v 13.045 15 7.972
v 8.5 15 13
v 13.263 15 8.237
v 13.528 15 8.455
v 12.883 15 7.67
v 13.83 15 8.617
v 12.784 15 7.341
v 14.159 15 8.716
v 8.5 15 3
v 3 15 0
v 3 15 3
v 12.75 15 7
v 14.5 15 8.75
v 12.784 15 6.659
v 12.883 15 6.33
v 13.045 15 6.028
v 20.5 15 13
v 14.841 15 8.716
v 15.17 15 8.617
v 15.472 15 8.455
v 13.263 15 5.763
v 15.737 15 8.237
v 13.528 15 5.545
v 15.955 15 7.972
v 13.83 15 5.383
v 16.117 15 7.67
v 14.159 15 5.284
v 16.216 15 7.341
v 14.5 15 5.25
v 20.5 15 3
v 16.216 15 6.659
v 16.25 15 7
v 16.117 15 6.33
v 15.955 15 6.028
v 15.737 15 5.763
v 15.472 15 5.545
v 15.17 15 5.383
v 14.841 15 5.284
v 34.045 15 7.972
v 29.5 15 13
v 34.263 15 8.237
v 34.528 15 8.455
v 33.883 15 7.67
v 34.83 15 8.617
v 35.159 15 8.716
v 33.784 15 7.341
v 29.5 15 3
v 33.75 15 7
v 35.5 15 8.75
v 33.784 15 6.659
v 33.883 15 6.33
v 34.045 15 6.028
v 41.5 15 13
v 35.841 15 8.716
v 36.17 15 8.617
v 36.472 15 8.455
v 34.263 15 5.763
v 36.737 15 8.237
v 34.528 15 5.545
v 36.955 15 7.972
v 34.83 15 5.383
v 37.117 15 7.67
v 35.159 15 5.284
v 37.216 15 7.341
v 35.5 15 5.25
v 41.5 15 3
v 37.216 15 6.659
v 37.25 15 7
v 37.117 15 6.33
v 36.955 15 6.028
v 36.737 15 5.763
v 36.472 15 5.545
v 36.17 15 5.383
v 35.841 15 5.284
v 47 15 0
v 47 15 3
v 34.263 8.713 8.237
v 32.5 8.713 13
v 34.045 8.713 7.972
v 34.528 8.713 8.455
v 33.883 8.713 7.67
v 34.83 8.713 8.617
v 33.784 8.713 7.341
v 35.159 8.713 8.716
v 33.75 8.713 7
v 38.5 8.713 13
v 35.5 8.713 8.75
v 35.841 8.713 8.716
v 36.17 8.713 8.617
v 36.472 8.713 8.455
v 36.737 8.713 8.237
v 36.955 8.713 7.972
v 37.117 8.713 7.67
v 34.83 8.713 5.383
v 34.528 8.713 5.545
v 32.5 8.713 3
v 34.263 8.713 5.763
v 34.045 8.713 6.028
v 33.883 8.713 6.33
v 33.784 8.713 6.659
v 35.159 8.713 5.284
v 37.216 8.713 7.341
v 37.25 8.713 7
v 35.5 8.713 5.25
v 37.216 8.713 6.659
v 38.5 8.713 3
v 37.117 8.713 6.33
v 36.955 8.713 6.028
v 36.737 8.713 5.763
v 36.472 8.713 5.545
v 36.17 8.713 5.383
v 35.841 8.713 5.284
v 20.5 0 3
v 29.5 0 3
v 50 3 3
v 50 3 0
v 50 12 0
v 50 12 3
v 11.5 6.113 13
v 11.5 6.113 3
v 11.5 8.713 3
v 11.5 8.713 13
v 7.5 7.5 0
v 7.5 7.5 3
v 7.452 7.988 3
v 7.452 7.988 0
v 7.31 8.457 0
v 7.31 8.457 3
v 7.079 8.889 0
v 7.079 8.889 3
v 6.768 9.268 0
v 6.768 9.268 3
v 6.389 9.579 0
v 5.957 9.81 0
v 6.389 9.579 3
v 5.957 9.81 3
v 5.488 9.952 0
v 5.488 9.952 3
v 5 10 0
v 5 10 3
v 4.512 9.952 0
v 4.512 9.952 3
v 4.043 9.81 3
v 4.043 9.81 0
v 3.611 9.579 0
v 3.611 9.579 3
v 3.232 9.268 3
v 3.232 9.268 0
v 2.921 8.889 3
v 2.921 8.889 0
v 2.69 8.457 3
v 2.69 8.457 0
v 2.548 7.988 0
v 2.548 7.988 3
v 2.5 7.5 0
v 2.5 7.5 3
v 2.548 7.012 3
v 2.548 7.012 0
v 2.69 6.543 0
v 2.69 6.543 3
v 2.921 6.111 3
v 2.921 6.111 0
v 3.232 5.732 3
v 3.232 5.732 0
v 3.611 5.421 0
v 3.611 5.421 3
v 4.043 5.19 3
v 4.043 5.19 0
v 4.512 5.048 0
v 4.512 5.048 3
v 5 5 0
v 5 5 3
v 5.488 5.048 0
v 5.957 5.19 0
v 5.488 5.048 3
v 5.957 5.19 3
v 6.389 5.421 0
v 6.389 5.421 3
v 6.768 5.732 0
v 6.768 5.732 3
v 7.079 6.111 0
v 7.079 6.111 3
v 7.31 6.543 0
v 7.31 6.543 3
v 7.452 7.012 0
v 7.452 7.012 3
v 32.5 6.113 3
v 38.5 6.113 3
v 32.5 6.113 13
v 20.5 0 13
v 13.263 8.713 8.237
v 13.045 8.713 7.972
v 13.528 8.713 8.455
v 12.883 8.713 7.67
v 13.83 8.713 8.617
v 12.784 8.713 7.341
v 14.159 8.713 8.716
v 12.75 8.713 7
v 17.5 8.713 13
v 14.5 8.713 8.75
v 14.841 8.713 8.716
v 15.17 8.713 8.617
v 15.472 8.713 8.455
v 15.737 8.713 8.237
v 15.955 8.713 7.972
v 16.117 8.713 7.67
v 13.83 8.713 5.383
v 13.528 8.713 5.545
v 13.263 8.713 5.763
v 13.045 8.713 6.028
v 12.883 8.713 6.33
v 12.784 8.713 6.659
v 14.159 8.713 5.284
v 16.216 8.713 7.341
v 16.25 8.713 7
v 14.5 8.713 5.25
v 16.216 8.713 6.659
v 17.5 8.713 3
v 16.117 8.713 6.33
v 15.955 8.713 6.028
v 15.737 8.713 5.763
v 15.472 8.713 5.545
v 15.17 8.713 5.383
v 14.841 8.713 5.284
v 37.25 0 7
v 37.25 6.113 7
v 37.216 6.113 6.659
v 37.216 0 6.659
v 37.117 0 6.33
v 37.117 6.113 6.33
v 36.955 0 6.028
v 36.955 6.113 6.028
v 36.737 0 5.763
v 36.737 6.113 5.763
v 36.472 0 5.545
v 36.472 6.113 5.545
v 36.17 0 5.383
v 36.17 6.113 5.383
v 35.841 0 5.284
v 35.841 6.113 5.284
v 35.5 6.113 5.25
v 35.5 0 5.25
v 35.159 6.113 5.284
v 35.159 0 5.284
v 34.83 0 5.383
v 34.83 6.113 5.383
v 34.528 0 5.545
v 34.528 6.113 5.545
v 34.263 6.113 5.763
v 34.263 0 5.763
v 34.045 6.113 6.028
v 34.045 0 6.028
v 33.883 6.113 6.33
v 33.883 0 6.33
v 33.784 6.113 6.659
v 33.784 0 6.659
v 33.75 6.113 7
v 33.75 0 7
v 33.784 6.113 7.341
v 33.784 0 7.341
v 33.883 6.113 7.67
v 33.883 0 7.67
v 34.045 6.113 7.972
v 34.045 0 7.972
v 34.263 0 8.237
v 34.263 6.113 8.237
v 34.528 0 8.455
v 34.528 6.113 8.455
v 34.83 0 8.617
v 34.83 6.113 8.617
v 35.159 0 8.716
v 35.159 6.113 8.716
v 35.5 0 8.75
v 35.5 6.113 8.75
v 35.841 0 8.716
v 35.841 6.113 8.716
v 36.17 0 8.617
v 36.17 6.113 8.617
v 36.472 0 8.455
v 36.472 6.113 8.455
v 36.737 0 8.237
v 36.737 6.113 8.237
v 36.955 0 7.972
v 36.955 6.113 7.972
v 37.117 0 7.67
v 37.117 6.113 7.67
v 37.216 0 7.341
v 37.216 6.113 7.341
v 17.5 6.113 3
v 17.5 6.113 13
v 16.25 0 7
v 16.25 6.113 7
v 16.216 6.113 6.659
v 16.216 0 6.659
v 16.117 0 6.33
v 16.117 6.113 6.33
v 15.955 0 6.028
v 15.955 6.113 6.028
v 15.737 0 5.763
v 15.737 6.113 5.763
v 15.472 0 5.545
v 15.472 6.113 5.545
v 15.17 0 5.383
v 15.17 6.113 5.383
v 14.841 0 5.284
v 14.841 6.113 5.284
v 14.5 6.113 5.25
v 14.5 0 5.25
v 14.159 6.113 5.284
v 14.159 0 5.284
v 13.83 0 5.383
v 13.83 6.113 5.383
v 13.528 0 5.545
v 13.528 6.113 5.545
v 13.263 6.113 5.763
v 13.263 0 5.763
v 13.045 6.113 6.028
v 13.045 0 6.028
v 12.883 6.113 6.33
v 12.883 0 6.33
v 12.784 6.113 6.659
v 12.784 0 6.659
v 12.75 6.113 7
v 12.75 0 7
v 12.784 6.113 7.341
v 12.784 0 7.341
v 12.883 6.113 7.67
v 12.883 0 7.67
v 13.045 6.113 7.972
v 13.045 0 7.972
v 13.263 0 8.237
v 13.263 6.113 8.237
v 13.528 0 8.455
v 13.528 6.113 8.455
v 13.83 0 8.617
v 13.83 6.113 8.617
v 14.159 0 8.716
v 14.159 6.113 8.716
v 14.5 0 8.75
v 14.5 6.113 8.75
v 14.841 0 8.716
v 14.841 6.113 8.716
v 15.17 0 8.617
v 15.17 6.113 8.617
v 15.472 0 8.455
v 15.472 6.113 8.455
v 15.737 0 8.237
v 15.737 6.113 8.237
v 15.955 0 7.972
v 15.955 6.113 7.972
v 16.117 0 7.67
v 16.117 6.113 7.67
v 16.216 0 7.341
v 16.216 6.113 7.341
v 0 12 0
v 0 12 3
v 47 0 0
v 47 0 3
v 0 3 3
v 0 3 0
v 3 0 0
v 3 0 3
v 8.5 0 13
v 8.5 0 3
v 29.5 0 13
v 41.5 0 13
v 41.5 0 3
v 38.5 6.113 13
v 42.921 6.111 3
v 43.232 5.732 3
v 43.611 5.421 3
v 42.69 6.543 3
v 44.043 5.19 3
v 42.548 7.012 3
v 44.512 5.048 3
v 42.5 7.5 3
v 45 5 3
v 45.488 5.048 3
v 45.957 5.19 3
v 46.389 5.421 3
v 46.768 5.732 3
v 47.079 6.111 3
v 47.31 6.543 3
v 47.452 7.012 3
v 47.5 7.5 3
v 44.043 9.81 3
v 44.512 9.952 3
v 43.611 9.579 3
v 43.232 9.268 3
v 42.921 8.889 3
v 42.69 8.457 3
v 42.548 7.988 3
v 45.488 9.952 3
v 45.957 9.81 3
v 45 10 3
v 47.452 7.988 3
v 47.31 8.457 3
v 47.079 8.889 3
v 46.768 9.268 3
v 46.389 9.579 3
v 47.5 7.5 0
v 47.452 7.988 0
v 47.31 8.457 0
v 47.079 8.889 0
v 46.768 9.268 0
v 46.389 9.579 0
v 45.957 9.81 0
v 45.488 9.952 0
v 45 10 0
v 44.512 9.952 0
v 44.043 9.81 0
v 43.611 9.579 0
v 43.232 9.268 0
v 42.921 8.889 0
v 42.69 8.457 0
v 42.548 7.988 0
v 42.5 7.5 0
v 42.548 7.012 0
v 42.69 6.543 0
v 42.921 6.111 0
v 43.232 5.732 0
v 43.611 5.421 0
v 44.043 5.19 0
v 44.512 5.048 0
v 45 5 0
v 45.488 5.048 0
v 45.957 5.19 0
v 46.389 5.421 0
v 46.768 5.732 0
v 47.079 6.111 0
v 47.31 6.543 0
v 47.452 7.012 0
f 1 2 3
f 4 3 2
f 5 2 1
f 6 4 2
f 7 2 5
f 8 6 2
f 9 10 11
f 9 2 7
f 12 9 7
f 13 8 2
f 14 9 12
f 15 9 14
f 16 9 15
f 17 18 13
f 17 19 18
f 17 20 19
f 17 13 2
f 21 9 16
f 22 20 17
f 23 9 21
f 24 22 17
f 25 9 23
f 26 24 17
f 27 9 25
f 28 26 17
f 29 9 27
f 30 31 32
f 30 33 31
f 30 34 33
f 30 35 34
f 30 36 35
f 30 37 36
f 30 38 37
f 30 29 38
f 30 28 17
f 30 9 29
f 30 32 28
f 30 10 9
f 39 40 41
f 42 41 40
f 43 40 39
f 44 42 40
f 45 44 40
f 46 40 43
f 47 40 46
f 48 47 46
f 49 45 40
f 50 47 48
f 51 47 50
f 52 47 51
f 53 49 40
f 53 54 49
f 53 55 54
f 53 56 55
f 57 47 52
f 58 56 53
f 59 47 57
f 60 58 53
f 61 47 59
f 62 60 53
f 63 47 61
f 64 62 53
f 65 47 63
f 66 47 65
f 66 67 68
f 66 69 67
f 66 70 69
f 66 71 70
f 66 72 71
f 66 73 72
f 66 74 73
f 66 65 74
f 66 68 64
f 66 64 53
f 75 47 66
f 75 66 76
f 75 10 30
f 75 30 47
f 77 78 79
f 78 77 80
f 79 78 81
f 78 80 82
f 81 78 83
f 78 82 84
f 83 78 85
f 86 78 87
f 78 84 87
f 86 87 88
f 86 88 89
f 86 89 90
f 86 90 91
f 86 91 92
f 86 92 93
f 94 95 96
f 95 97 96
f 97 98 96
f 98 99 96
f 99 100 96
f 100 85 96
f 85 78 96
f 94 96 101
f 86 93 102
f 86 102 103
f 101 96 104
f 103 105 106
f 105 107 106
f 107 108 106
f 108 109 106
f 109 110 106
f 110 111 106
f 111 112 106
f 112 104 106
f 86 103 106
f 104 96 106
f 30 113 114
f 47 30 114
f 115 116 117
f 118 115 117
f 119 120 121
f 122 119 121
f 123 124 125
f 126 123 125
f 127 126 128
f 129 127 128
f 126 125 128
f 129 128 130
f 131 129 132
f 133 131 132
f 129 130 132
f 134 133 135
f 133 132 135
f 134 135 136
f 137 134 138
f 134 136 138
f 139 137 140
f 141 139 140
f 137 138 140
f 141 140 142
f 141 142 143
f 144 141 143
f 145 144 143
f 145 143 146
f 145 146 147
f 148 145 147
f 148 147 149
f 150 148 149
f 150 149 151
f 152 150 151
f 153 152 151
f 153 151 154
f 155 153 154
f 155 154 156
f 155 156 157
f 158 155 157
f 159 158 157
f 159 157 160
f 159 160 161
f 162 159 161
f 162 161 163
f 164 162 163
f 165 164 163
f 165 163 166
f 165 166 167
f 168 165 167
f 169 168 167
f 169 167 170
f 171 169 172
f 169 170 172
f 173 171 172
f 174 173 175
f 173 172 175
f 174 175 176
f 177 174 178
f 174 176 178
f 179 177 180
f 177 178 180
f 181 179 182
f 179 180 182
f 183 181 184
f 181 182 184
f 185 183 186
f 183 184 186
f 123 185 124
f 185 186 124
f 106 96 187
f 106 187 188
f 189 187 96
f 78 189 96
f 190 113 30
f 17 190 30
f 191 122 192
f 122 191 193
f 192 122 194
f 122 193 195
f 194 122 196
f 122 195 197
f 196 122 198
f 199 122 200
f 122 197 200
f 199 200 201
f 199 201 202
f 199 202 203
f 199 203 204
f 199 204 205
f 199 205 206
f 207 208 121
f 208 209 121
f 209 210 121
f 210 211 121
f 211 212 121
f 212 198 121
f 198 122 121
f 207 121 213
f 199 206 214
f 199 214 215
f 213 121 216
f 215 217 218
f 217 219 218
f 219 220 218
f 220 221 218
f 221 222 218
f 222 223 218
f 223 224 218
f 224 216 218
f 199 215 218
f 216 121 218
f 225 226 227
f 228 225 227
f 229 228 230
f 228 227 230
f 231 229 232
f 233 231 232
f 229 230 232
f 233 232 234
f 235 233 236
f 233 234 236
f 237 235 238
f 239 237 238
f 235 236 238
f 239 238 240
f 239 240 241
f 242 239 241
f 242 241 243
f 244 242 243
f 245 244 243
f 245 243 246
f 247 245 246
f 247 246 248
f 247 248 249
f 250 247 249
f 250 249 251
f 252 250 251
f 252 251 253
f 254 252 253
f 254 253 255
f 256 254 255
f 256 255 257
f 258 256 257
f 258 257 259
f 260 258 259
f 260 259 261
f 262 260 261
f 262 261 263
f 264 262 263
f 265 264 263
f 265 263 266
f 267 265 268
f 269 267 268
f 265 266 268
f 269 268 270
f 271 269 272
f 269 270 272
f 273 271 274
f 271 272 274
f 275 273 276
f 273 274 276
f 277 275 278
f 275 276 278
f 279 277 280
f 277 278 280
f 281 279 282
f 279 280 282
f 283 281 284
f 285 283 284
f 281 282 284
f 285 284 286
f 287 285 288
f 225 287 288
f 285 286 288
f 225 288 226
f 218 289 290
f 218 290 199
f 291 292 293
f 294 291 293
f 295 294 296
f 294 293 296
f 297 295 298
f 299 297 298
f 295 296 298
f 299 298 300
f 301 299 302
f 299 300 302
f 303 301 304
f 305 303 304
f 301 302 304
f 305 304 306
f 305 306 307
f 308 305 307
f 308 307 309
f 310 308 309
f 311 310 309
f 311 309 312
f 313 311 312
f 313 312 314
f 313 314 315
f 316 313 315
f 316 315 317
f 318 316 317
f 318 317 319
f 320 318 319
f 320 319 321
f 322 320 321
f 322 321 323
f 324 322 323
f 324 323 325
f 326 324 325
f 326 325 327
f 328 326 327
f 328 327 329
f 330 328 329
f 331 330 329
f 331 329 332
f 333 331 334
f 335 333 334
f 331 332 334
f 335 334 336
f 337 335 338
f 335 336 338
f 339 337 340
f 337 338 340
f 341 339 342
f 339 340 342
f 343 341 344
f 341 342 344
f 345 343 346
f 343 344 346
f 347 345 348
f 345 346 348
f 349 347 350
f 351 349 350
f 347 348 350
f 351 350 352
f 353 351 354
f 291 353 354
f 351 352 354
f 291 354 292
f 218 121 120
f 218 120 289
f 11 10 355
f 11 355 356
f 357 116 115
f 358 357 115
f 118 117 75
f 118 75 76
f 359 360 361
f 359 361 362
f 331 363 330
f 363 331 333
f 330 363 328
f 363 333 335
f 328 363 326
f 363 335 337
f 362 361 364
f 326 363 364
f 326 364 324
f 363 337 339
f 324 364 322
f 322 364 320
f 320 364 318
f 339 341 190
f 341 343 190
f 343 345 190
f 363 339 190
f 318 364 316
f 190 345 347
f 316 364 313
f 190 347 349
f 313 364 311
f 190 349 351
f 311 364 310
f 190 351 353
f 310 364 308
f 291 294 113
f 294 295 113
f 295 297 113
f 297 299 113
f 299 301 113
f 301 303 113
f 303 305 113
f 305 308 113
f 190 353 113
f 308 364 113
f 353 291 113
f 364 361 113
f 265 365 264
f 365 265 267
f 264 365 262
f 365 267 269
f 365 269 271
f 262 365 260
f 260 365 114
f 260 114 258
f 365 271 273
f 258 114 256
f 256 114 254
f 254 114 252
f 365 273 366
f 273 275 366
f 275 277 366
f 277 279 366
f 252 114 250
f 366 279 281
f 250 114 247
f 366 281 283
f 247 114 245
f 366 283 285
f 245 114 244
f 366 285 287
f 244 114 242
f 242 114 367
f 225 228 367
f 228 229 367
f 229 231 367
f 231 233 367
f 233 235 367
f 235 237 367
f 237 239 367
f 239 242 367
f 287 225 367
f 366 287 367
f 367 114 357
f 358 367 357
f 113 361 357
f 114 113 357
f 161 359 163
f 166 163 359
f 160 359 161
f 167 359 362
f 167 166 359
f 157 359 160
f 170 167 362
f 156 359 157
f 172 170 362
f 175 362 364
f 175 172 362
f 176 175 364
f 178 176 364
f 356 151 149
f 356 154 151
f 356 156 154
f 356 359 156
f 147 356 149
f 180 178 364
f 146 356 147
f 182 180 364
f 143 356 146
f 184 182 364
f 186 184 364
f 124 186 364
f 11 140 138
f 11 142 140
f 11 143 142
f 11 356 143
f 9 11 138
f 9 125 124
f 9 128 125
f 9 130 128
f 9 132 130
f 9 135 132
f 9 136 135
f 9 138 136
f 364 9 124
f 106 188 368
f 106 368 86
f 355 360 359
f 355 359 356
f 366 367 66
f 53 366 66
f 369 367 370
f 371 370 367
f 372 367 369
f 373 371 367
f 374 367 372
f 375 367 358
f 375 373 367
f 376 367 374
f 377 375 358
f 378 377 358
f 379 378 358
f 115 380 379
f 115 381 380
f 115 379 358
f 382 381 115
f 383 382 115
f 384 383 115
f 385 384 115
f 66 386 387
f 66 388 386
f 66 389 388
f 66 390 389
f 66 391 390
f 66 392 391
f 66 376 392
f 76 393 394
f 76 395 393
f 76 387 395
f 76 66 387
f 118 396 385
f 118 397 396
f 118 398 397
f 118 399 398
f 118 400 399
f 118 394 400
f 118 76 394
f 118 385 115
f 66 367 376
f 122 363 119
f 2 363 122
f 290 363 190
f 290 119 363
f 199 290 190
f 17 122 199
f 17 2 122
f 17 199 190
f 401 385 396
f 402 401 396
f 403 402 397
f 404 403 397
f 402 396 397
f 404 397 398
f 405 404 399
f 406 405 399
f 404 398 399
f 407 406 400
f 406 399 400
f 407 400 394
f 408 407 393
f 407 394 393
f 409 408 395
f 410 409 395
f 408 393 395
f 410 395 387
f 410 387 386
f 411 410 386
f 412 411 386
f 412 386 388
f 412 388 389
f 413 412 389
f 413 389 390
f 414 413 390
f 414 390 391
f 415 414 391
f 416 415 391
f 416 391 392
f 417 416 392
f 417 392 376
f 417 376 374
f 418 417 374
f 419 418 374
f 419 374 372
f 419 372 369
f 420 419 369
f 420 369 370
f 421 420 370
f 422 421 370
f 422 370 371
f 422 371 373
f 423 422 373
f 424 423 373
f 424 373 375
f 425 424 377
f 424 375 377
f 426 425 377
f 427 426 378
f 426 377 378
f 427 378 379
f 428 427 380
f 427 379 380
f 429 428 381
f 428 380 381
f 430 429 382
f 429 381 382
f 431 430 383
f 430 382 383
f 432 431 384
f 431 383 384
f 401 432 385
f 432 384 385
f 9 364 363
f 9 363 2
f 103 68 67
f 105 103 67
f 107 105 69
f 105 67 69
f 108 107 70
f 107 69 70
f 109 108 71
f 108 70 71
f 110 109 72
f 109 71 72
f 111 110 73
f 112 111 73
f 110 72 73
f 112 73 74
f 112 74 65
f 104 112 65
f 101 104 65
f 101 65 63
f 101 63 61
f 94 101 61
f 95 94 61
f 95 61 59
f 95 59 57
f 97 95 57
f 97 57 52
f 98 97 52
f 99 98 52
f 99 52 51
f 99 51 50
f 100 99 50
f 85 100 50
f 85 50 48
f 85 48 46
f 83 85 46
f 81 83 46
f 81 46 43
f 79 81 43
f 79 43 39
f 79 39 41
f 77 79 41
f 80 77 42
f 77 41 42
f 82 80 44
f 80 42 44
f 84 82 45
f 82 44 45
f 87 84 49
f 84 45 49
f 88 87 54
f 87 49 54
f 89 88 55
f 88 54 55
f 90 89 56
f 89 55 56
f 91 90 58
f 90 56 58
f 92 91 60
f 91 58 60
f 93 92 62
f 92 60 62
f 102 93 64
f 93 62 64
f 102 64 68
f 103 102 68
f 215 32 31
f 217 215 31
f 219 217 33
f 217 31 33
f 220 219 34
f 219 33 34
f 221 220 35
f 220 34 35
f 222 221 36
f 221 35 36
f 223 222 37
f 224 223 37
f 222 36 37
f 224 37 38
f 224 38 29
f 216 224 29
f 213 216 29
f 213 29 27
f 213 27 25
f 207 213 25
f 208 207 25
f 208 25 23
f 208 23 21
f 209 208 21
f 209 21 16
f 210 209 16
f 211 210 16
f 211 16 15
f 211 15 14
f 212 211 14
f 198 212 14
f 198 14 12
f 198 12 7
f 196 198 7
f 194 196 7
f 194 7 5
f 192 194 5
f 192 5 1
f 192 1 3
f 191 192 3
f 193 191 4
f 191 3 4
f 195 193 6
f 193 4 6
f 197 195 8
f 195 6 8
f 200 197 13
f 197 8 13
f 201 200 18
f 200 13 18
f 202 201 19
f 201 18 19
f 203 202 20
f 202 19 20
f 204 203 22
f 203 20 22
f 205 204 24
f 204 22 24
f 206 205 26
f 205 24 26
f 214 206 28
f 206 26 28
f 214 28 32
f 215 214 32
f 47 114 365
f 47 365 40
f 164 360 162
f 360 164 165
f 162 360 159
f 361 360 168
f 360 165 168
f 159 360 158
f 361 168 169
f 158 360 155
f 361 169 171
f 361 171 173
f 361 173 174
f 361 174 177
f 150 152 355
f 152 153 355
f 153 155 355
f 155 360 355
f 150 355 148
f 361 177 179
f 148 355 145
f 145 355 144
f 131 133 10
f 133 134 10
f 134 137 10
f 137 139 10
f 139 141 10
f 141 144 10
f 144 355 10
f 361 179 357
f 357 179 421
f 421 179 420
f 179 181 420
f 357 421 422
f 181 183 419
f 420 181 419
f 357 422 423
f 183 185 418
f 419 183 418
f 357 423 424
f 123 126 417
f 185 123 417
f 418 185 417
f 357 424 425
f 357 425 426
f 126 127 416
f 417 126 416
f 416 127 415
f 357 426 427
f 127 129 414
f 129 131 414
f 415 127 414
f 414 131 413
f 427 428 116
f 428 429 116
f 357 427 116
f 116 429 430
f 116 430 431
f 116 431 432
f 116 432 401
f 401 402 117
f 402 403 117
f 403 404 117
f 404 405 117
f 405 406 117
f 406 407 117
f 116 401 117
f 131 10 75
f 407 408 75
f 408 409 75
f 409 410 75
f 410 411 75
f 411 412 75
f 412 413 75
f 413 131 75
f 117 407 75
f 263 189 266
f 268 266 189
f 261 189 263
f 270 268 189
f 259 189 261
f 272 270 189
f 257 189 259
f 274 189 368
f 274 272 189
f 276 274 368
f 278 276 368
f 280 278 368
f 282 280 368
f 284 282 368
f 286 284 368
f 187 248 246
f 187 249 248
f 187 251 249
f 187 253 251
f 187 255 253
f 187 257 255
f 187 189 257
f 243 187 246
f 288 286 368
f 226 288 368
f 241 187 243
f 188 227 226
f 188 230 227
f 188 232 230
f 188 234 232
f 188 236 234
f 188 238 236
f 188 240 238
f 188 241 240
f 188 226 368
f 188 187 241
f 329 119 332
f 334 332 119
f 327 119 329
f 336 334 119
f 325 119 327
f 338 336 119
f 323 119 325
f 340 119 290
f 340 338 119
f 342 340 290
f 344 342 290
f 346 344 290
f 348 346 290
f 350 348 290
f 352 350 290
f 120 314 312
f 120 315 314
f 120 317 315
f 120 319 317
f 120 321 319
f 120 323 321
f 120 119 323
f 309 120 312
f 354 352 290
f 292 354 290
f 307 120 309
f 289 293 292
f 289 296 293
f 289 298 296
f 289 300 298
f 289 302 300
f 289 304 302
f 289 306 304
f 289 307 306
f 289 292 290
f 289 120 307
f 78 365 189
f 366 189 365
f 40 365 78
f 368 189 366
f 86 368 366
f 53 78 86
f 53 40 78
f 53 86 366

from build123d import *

# Parameters (mm, degrees)
SKETCH1_W           = 50
SKETCH1_H           = 15
BOSS_EXTRUDE1_DEPTH = 3
SKETCH2_R           = 2.5
CUT_EXTRUDE1_DEPTH  = 4
SKETCH3_W           = 12
SKETCH3_H           = 15
SKETCH3_W_2         = 6
SKETCH3_H_2         = 2.6
BOSS_EXTRUDE2_DEPTH = 10
SKETCH4_R           = 1.75
CUT_EXTRUDE2_DEPTH  = 16
CHAMFER1_SIZE       = 3


with BuildPart() as part:
    # Sketch1 → Boss-Extrude1 (new body)
    with BuildSketch(Plane.XY):
        with Locations((25, 7.5)):
            Rectangle(SKETCH1_W, SKETCH1_H)
    extrude(amount=BOSS_EXTRUDE1_DEPTH)

    # Sketch2 → Cut-Extrude1 (cut, through all)
    with BuildSketch(Plane.XY.offset(3)):
        with Locations((5, 7.5)):
            Circle(SKETCH2_R)
        with Locations((45, 7.5)):
            Circle(SKETCH2_R)
    extrude(amount=-CUT_EXTRUDE1_DEPTH, mode=Mode.SUBTRACT)

    # Sketch3 → Boss-Extrude2 (add)
    with BuildSketch(Plane.XY.offset(3)):
        with Locations((14.5, 7.5)):
            Rectangle(SKETCH3_W, SKETCH3_H)
        with Locations((14.5, 7.412594685)):
            Rectangle(SKETCH3_W_2, SKETCH3_H_2, mode=Mode.SUBTRACT)
        with Locations((35.5, 7.5)):
            Rectangle(SKETCH3_W, SKETCH3_H)
        with Locations((35.5, 7.412594685)):
            Rectangle(SKETCH3_W_2, SKETCH3_H_2, mode=Mode.SUBTRACT)
    extrude(amount=BOSS_EXTRUDE2_DEPTH)

    # Sketch4 → Cut-Extrude2 (cut, through all)
    with BuildSketch(Plane(origin=(0, 15, 0), x_dir=(1, 0, 0), z_dir=(0, 1, 0))):
        with Locations((35.5, -7)):
            Circle(SKETCH4_R)
        with Locations((14.5, -7)):
            Circle(SKETCH4_R)
    extrude(amount=-CUT_EXTRUDE2_DEPTH, mode=Mode.SUBTRACT)

    # Chamfer1
    chamfer1_edges = [part.edges().sort_by_distance(p)[0] for p in [
        (50, 15, 1.5),
        (50, 0, 1.5),
        (0, 0, 1.5),
        (0, 15, 1.5),
    ]]
    chamfer(chamfer1_edges, length=CHAMFER1_SIZE)


solid = part.part
